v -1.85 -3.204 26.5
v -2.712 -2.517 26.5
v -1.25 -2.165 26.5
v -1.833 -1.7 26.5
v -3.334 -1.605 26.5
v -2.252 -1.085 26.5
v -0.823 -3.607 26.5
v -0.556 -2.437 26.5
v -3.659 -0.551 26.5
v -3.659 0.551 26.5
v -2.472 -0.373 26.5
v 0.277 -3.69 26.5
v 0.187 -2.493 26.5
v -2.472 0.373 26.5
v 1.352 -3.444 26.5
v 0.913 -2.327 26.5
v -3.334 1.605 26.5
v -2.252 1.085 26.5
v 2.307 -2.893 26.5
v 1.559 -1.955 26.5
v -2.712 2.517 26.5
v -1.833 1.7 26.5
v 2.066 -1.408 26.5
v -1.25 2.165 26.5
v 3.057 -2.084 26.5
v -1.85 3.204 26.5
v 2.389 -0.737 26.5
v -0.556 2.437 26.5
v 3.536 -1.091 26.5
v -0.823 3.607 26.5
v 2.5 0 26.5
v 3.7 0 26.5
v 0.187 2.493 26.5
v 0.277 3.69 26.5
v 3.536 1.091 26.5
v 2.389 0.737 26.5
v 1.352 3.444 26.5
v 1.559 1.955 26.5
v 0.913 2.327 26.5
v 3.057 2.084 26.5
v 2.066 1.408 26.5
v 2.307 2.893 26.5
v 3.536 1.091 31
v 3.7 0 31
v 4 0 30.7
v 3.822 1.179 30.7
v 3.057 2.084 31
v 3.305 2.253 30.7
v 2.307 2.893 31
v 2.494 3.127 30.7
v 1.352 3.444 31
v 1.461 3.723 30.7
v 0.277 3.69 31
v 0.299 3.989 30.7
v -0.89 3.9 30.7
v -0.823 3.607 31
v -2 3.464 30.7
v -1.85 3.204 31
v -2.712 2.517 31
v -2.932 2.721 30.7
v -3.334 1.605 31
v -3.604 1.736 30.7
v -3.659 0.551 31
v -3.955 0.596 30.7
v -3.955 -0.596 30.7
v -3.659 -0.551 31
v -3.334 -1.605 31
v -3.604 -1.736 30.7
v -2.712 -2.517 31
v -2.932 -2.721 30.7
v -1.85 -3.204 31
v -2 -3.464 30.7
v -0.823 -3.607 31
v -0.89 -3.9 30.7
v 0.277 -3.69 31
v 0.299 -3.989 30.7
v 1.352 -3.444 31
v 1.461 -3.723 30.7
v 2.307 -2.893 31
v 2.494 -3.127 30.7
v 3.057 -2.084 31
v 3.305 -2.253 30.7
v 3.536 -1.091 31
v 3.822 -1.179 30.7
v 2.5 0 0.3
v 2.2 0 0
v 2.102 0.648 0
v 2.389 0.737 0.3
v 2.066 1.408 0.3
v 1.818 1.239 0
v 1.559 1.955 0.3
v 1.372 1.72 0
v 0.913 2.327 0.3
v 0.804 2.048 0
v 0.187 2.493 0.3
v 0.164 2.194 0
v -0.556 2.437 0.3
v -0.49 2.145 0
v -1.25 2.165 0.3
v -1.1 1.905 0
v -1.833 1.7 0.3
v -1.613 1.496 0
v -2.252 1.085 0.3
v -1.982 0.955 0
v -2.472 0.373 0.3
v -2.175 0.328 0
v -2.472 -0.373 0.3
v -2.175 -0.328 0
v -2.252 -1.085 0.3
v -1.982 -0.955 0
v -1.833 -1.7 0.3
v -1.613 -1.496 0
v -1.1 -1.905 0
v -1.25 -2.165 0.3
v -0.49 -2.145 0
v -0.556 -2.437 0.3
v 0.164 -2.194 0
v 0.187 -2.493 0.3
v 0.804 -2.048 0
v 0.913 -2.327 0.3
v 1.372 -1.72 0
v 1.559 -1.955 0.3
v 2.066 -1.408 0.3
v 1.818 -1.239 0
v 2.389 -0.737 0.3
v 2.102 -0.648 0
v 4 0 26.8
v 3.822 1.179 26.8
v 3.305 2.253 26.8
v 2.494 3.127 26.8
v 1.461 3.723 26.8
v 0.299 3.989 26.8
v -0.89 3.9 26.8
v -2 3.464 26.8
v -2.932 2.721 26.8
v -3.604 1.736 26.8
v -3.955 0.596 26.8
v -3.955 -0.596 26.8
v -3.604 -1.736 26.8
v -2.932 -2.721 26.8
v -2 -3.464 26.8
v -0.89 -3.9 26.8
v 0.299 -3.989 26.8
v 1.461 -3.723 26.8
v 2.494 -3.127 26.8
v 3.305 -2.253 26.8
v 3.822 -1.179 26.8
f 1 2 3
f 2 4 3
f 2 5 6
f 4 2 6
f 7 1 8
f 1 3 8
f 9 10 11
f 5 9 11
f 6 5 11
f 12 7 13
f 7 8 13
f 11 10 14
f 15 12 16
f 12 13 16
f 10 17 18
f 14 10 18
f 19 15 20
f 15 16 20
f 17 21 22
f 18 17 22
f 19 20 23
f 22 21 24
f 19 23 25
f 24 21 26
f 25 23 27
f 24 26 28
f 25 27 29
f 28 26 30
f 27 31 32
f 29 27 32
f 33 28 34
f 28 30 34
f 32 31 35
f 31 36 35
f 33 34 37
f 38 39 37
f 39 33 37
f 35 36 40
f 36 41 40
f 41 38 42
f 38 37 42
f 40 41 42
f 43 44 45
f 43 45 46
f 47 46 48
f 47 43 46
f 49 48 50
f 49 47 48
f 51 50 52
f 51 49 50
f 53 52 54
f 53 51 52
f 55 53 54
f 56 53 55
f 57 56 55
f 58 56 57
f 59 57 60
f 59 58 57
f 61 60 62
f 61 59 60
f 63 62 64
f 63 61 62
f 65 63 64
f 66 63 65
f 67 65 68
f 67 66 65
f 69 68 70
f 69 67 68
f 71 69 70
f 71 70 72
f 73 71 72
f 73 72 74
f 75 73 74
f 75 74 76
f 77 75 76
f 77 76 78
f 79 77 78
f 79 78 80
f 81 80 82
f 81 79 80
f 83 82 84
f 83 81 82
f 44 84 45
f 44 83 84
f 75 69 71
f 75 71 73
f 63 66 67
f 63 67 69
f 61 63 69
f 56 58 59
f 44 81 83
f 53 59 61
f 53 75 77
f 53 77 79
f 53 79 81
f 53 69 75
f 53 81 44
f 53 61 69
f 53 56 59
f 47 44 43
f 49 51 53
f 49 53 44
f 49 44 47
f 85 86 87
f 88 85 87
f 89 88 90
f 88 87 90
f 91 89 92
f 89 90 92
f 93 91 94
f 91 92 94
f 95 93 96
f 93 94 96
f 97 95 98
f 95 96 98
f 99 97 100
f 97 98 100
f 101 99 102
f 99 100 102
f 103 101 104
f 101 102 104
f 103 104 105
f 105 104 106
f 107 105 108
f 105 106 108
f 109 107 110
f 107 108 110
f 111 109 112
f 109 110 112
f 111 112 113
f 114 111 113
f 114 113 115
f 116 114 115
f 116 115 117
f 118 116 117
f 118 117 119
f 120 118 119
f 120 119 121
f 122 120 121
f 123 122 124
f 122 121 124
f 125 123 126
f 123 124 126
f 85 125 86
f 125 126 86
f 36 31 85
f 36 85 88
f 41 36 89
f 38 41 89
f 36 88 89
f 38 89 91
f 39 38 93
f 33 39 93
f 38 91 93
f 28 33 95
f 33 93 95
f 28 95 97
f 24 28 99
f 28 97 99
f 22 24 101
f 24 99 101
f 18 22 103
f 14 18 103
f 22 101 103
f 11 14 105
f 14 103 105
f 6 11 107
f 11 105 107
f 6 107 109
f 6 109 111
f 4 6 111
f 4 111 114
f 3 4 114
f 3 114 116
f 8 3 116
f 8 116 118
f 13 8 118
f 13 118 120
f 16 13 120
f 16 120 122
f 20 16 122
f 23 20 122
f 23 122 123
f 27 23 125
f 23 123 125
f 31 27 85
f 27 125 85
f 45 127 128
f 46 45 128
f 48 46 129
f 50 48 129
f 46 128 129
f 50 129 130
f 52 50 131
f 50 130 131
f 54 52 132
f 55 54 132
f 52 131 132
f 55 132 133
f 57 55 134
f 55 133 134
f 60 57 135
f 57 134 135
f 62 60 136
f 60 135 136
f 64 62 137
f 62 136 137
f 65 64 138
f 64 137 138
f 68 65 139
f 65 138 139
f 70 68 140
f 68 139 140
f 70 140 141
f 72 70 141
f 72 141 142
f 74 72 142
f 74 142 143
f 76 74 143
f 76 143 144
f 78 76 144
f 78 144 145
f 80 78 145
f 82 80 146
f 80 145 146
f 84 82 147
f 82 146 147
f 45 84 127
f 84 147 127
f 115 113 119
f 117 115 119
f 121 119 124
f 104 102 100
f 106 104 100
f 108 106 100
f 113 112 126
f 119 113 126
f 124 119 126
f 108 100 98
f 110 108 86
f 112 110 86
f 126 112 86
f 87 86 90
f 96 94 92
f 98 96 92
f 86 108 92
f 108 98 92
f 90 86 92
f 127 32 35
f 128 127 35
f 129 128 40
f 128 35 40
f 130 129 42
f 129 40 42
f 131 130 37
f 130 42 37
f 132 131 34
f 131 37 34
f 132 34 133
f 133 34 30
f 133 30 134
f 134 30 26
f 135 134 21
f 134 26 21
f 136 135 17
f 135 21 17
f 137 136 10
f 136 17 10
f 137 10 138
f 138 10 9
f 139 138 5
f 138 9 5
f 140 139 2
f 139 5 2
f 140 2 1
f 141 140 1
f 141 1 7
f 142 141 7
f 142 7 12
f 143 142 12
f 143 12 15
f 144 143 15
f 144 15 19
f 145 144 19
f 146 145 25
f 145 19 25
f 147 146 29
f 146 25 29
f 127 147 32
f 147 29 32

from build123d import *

# Parameters (mm, degrees)
SKETCH1_R           = 2.5
BOSS_EXTRUDE1_DEPTH = 26.5
SKETCH2_R           = 4
BOSS_EXTRUDE2_DEPTH = 4.5
CHAMFER1_SIZE       = 0.3


with BuildPart() as part:
    # Sketch1 → Boss-Extrude1 (new body)
    with BuildSketch(Plane.XY):
        Circle(SKETCH1_R)
    extrude(amount=BOSS_EXTRUDE1_DEPTH)

    # Sketch2 → Boss-Extrude2 (add)
    with BuildSketch(Plane.XY.offset(26.5)):
        Circle(SKETCH2_R)
    extrude(amount=BOSS_EXTRUDE2_DEPTH)

    # Chamfer1
    chamfer1_edges = [part.edges().sort_by_distance(p)[0] for p in [
        (-2.5, 0, 0),
        (-4, 0, 26.5),
        (-4, 0, 31),
    ]]
    chamfer(chamfer1_edges, length=CHAMFER1_SIZE)


solid = part.part
